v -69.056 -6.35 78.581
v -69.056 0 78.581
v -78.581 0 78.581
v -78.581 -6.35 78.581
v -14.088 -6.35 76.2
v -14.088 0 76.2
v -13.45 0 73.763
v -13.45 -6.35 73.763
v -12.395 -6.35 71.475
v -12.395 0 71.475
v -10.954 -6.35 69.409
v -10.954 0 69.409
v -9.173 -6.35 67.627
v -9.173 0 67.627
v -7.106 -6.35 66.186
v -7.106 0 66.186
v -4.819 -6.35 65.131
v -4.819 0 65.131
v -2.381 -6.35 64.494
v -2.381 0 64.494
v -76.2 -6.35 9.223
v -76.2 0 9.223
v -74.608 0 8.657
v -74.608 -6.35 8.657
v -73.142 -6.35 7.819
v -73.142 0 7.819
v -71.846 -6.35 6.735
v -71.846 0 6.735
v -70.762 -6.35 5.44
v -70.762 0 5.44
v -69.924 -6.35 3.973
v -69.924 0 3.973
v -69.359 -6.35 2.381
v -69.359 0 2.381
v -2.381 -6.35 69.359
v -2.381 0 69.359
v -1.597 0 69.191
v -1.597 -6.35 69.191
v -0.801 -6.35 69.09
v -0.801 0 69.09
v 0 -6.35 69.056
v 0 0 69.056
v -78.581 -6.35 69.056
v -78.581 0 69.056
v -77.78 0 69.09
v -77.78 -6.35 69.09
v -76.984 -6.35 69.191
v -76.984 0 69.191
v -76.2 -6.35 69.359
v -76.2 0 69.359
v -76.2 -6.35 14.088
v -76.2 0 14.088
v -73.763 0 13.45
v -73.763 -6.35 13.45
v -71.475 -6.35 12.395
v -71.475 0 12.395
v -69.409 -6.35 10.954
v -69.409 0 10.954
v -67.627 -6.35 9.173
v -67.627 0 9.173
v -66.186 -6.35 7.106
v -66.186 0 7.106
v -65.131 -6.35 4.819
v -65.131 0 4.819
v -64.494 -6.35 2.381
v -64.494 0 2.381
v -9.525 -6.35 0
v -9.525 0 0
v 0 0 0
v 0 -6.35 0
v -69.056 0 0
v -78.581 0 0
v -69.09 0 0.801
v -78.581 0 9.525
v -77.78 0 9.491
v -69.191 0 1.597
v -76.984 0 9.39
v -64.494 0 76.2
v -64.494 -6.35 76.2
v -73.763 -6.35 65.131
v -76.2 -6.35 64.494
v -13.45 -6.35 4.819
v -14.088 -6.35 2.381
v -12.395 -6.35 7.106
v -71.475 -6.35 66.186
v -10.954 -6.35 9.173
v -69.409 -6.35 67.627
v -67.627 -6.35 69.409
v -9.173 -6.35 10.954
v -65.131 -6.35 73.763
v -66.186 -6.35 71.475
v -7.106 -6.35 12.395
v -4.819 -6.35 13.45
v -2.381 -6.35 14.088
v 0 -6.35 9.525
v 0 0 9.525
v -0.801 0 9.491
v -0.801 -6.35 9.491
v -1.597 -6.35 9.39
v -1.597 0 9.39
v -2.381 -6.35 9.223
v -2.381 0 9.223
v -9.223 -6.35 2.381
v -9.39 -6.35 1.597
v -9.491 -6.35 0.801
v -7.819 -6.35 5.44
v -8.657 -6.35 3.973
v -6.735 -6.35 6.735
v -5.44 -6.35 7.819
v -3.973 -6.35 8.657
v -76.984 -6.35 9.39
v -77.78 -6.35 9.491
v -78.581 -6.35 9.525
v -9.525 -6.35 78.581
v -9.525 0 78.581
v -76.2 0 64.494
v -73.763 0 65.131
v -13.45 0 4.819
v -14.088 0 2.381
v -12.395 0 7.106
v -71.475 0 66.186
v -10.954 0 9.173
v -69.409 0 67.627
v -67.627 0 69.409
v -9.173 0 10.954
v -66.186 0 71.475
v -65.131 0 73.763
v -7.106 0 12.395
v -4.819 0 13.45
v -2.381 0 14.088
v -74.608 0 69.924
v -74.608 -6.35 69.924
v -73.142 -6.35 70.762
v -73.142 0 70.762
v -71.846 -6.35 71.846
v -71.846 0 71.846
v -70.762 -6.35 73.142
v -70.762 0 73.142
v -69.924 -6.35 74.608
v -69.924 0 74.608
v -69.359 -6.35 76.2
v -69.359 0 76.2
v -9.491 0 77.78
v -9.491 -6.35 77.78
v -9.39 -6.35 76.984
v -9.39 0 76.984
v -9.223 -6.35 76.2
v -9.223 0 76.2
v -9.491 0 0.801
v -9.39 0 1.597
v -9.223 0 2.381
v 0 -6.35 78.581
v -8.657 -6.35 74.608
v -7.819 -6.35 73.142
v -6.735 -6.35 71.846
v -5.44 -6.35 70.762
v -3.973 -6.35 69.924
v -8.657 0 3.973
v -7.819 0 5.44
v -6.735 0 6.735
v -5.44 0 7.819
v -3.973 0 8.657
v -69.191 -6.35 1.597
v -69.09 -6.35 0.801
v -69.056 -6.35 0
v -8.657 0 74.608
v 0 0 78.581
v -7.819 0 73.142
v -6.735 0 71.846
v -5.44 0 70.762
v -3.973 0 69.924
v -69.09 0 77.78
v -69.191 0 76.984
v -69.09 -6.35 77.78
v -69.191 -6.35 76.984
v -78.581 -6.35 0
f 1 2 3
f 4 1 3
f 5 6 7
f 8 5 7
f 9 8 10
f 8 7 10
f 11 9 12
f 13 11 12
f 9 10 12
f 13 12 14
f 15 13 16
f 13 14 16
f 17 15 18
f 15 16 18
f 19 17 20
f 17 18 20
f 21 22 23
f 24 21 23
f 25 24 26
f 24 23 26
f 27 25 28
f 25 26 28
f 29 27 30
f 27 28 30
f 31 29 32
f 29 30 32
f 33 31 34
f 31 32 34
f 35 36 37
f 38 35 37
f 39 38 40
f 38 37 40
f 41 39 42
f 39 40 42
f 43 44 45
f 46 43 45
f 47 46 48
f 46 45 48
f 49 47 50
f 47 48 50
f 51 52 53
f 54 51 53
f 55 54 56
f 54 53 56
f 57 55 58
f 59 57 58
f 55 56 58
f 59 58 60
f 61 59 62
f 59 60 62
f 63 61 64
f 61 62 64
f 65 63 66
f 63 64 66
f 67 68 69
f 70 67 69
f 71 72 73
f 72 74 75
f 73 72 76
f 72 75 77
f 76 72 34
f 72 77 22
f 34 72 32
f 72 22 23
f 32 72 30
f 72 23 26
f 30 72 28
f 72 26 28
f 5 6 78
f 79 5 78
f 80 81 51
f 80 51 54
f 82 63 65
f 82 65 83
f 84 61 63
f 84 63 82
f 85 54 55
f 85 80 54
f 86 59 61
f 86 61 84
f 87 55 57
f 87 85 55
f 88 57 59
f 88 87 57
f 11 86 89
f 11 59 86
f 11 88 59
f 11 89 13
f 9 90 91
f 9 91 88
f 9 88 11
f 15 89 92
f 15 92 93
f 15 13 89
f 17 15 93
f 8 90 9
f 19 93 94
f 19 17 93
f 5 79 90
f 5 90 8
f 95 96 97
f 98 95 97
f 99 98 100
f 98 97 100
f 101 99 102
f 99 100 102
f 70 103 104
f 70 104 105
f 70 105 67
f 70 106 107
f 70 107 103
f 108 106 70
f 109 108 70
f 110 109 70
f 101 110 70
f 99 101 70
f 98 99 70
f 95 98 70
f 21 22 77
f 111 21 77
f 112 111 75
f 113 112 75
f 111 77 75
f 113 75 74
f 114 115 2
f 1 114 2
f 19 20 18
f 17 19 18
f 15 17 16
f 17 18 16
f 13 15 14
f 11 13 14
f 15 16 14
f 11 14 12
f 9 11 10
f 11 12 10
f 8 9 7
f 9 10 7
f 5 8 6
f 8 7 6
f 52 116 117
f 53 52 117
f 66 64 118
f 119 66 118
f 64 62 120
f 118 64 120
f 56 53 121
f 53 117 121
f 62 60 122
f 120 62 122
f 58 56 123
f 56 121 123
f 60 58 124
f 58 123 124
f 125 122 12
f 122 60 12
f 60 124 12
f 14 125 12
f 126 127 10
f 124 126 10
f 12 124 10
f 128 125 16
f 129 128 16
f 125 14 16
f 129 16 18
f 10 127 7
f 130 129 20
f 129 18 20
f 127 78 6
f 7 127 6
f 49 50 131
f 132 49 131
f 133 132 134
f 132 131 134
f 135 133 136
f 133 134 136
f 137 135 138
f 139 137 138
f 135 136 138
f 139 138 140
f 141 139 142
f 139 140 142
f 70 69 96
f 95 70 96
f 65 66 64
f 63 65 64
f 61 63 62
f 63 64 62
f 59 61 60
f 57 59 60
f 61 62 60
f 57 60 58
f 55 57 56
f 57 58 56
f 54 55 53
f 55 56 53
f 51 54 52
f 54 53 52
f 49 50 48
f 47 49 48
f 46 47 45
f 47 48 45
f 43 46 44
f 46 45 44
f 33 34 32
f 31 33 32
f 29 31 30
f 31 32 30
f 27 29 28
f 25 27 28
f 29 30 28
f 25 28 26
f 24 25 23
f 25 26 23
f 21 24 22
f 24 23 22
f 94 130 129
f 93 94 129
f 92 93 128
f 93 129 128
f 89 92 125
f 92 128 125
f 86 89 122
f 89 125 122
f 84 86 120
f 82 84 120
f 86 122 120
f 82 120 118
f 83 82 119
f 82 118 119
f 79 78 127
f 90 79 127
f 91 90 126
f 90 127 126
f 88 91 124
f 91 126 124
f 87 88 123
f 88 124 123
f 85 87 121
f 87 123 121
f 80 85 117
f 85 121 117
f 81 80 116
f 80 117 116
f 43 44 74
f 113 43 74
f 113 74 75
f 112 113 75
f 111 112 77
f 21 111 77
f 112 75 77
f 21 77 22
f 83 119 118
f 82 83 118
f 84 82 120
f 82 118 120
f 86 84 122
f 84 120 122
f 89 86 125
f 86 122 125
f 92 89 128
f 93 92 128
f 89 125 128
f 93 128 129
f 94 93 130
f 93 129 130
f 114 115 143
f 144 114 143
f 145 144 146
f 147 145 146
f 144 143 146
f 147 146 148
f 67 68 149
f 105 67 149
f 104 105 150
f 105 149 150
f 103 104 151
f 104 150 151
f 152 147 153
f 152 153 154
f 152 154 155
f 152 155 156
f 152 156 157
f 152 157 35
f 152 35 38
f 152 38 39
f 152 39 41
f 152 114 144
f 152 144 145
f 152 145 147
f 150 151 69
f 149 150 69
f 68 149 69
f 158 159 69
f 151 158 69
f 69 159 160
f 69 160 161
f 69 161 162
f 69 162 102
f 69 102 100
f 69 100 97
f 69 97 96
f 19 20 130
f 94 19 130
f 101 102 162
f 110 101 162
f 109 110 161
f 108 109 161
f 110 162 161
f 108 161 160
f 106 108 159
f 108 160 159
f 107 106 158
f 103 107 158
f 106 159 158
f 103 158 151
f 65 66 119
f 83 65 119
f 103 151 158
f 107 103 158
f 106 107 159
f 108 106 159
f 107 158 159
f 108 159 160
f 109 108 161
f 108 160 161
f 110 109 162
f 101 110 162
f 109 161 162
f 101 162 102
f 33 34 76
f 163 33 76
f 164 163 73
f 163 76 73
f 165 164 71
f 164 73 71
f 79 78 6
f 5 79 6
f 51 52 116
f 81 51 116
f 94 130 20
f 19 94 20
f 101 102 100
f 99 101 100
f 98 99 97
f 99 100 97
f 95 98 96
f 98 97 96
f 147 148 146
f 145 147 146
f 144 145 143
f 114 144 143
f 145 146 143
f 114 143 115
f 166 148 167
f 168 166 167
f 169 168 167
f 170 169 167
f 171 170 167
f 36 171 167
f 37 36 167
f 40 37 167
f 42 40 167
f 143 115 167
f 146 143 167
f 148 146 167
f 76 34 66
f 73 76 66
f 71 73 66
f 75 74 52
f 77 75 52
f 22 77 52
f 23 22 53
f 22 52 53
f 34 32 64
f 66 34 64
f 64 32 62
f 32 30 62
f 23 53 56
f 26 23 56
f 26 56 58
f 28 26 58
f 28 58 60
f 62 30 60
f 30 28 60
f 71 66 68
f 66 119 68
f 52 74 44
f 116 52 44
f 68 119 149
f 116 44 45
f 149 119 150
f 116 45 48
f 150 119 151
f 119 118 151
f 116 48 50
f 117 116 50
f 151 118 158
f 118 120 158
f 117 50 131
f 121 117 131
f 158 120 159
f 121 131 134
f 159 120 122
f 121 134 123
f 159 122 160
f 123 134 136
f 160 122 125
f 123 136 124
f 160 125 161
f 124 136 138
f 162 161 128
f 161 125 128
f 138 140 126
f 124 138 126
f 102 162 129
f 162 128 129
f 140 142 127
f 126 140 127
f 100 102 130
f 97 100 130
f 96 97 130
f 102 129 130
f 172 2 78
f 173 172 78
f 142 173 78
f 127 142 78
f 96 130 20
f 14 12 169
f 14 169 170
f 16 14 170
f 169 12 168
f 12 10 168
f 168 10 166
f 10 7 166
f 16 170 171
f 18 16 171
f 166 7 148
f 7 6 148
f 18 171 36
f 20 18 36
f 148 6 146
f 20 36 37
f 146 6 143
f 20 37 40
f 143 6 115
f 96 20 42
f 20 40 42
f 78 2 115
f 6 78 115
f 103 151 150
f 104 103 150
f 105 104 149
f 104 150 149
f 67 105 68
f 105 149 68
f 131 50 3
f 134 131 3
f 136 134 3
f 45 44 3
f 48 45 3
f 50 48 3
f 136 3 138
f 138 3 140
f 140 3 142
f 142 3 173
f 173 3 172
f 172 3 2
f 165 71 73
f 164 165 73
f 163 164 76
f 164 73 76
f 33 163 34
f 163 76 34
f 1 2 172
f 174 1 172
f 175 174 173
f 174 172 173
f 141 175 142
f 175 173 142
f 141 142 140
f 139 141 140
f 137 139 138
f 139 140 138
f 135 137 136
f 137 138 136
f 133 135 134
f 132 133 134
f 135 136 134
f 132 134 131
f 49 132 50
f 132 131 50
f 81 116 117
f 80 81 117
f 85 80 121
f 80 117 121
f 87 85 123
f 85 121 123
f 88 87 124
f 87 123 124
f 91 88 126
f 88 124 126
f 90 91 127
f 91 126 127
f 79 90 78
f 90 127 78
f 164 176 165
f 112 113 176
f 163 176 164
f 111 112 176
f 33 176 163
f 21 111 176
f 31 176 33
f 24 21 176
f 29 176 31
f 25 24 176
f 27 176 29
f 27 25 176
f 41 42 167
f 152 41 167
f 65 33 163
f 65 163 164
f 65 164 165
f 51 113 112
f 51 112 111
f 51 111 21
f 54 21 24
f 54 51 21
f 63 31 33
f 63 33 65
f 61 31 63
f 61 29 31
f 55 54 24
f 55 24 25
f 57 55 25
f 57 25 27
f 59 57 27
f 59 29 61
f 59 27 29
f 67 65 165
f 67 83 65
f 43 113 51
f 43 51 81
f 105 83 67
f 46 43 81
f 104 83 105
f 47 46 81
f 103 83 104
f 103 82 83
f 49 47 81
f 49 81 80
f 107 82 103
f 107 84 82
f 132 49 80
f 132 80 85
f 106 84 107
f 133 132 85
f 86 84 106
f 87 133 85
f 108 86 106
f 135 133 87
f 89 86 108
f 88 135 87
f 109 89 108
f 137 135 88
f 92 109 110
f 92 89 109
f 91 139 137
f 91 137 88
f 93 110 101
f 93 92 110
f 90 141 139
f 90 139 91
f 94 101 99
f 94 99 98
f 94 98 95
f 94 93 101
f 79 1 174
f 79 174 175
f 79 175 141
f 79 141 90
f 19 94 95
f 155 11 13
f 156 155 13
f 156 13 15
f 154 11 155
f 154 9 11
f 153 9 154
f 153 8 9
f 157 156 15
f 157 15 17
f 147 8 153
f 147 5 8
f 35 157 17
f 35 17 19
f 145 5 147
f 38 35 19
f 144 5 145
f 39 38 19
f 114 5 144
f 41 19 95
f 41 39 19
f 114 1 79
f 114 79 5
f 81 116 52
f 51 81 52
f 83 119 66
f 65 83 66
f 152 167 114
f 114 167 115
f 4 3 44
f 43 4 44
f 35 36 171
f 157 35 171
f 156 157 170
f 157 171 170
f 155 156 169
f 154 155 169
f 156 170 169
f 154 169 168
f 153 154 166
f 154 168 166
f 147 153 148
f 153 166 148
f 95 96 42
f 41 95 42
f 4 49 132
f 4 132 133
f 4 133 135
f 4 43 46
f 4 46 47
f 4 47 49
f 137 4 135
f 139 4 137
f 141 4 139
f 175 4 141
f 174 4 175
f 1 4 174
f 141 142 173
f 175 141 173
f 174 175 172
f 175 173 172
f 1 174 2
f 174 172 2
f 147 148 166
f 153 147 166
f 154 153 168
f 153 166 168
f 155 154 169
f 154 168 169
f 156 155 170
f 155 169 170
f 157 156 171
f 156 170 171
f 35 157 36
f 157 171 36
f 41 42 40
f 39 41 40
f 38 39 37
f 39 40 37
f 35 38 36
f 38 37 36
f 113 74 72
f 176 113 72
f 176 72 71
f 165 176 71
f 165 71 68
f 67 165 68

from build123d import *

# Parameters (mm, degrees)
F2_DEPTH = 6.35
F3_DEPTH = 6.35
F1_W     = 2.38125
F1_H     = 2.38125
F4_DEPTH = 6.35


with BuildPart() as f2:
    # F1 (on face) → F2 (new body)
    with BuildSketch(Plane.XZ):
        with BuildLine():
            Line((-76.2, 64.4935850165), (-76.2, 14.0876649835))
            ThreePointArc((-76.2, 14.0876649835), (-68.4784618638, 10.1027881362), (-64.4935850165, 2.38125))
            Line((-64.4935850165, 2.38125), (-14.0876649835, 2.38125))
            ThreePointArc((-14.0876649835, 2.38125), (-10.1027881362, 10.1027881362), (-2.38125, 14.0876649835))
            Line((-2.38125, 14.0876649835), (-2.38125, 64.4935850165))
            ThreePointArc((-2.38125, 64.4935850165), (-10.1027881362, 68.4784618638), (-14.0876649835, 76.2))
            Line((-14.0876649835, 76.2), (-64.4935850165, 76.2))
            ThreePointArc((-64.4935850165, 76.2), (-68.4784618638, 68.4784618638), (-76.2, 64.4935850165))
        make_face()
    extrude(amount=F2_DEPTH)


with BuildPart() as f3:
    # F1 (on face) → F3 (new body)
    with BuildSketch(Plane.XZ):
        with BuildLine():
            Line((-76.2, 76.2), (-76.2, 69.3587084068))
            ThreePointArc((-76.2, 69.3587084068), (-71.8460579092, 71.8460579092), (-69.3587084068, 76.2))
            Line((-69.3587084068, 76.2), (-76.2, 76.2))
        make_face()
        with BuildLine():
            Line((-78.58125, 78.58125), (-78.58125, 69.05625))
            ThreePointArc((-78.58125, 69.05625), (-77.3810591141, 69.1321671431), (-76.2, 69.3587084068))
            Line((-76.2, 69.3587084068), (-76.2, 76.2))
            Line((-76.2, 76.2), (-69.3587084068, 76.2))
            ThreePointArc((-69.3587084068, 76.2), (-69.1321671431, 77.3810591141), (-69.05625, 78.58125))
            Line((-69.05625, 78.58125), (-78.58125, 78.58125))
        make_face()
    extrude(amount=F3_DEPTH)


with BuildPart() as f3b:
    # F1 (on face) → F3, piece 2 (new body)
    with BuildSketch(Plane.XZ):
        with BuildLine():
            Line((-2.38125, 76.2), (-9.2225415932, 76.2))
            ThreePointArc((-9.2225415932, 76.2), (-6.7351920908, 71.8460579092), (-2.38125, 69.3587084068))
            Line((-2.38125, 69.3587084068), (-2.38125, 76.2))
        make_face()
        with BuildLine():
            ThreePointArc((-2.38125, 69.3587084068), (-1.2001908859, 69.1321671431), (0, 69.05625))
            Line((0, 69.05625), (0, 76.2))
            Line((0, 76.2), (-2.38125, 76.2))
            Line((-2.38125, 76.2), (-2.38125, 69.3587084068))
        make_face()
        with BuildLine():
            Line((0, 78.58125), (-9.525, 78.58125))
            ThreePointArc((-9.525, 78.58125), (-9.4490828569, 77.3810591141), (-9.2225415932, 76.2))
            Line((-9.2225415932, 76.2), (-2.38125, 76.2))
            Line((-2.38125, 76.2), (0, 76.2))
            Line((0, 76.2), (0, 78.58125))
        make_face()
    extrude(amount=F3_DEPTH)


with BuildPart() as f3c:
    # F1 (on face) → F3, piece 3 (new body)
    with BuildSketch(Plane.XZ):
        with BuildLine():
            ThreePointArc((-9.2225415932, 2.38125), (-9.4490828569, 1.2001908859), (-9.525, 0))
            Line((-9.525, 0), (-2.38125, 0))
            Line((-2.38125, 0), (-2.38125, 2.38125))
            Line((-2.38125, 2.38125), (-9.2225415932, 2.38125))
        make_face()
        with BuildLine():
            ThreePointArc((-2.38125, 9.2225415932), (-6.7351920908, 6.7351920908), (-9.2225415932, 2.38125))
            Line((-9.2225415932, 2.38125), (-2.38125, 2.38125))
            Line((-2.38125, 2.38125), (-2.38125, 9.2225415932))
        make_face()
        with Locations((-1.190625, 1.190625)):
            Rectangle(F1_W, F1_H)
        with BuildLine():
            Line((-2.38125, 2.38125), (0, 2.38125))
            Line((0, 2.38125), (0, 9.525))
            ThreePointArc((0, 9.525), (-1.2001908859, 9.4490828569), (-2.38125, 9.2225415932))
            Line((-2.38125, 9.2225415932), (-2.38125, 2.38125))
        make_face()
    extrude(amount=F3_DEPTH)


with BuildPart() as f3d:
    # F1 (on face) → F3, piece 4 (new body)
    with BuildSketch(Plane.XZ):
        with BuildLine():
            ThreePointArc((-69.3587084068, 2.38125), (-71.8460579092, 6.7351920908), (-76.2, 9.2225415932))
            Line((-76.2, 9.2225415932), (-76.2, 2.38125))
            Line((-76.2, 2.38125), (-69.3587084068, 2.38125))
        make_face()
        with BuildLine():
            Line((-76.2, 2.38125), (-76.2, 0))
            Line((-76.2, 0), (-69.05625, 0))
            ThreePointArc((-69.05625, 0), (-69.1321671431, 1.2001908859), (-69.3587084068, 2.38125))
            Line((-69.3587084068, 2.38125), (-76.2, 2.38125))
        make_face()
        with BuildLine():
            Line((-78.58125, 9.525), (-78.58125, 0))
            Line((-78.58125, 0), (-76.2, 0))
            Line((-76.2, 0), (-76.2, 2.38125))
            Line((-76.2, 2.38125), (-76.2, 9.2225415932))
            ThreePointArc((-76.2, 9.2225415932), (-77.3810591141, 9.4490828569), (-78.58125, 9.525))
        make_face()
    extrude(amount=F3_DEPTH)


with BuildPart() as f4:
    # F1 (on face) → F4 (new body)
    with BuildSketch(Plane.XZ):
        with BuildLine():
            ThreePointArc((-64.4935850165, 76.2), (-64.3437964057, 77.3864398063), (-64.29375, 78.58125))
            Line((-64.29375, 78.58125), (-69.05625, 78.58125))
            ThreePointArc((-69.05625, 78.58125), (-69.1321671431, 77.3810591141), (-69.3587084068, 76.2))
            Line((-69.3587084068, 76.2), (-64.4935850165, 76.2))
        make_face()
        with BuildLine():
            Line((-76.2, 69.3587084068), (-76.2, 64.4935850165))
            ThreePointArc((-76.2, 64.4935850165), (-68.4784618638, 68.4784618638), (-64.4935850165, 76.2))
            Line((-64.4935850165, 76.2), (-69.3587084068, 76.2))
            ThreePointArc((-69.3587084068, 76.2), (-71.8460579092, 71.8460579092), (-76.2, 69.3587084068))
        make_face()
        with BuildLine():
            Line((-78.58125, 69.05625), (-78.58125, 64.29375))
            ThreePointArc((-78.58125, 64.29375), (-77.3864398063, 64.3437964057), (-76.2, 64.4935850165))
            Line((-76.2, 64.4935850165), (-76.2, 69.3587084068))
            ThreePointArc((-76.2, 69.3587084068), (-77.3810591141, 69.1321671431), (-78.58125, 69.05625))
        make_face()
        with BuildLine():
            Line((-78.58125, 64.29375), (-78.58125, 14.2875))
            ThreePointArc((-78.58125, 14.2875), (-77.3864398063, 14.2374535943), (-76.2, 14.0876649835))
            Line((-76.2, 14.0876649835), (-76.2, 64.4935850165))
            ThreePointArc((-76.2, 64.4935850165), (-77.3864398063, 64.3437964057), (-78.58125, 64.29375))
        make_face()
        with BuildLine():
            ThreePointArc((-76.2, 14.0876649835), (-77.3864398063, 14.2374535943), (-78.58125, 14.2875))
            Line((-78.58125, 14.2875), (-78.58125, 9.525))
            ThreePointArc((-78.58125, 9.525), (-77.3810591141, 9.4490828569), (-76.2, 9.2225415932))
            Line((-76.2, 9.2225415932), (-76.2, 14.0876649835))
        make_face()
        with BuildLine():
            ThreePointArc((-64.4935850165, 2.38125), (-68.4784618638, 10.1027881362), (-76.2, 14.0876649835))
            Line((-76.2, 14.0876649835), (-76.2, 9.2225415932))
            ThreePointArc((-76.2, 9.2225415932), (-71.8460579092, 6.7351920908), (-69.3587084068, 2.38125))
            Line((-69.3587084068, 2.38125), (-64.4935850165, 2.38125))
        make_face()
        with BuildLine():
            Line((-69.05625, 0), (-64.29375, 0))
            ThreePointArc((-64.29375, 0), (-64.3437964057, 1.1948101937), (-64.4935850165, 2.38125))
            Line((-64.4935850165, 2.38125), (-69.3587084068, 2.38125))
            ThreePointArc((-69.3587084068, 2.38125), (-69.1321671431, 1.2001908859), (-69.05625, 0))
        make_face()
        with BuildLine():
            Line((-64.29375, 0), (-14.2875, 0))
            ThreePointArc((-14.2875, 0), (-14.2374535943, 1.1948101937), (-14.0876649835, 2.38125))
            Line((-14.0876649835, 2.38125), (-64.4935850165, 2.38125))
            ThreePointArc((-64.4935850165, 2.38125), (-64.3437964057, 1.1948101937), (-64.29375, 0))
        make_face()
        with BuildLine():
            ThreePointArc((-2.38125, 14.0876649835), (-10.1027881362, 10.1027881362), (-14.0876649835, 2.38125))
            Line((-14.0876649835, 2.38125), (-9.2225415932, 2.38125))
            ThreePointArc((-9.2225415932, 2.38125), (-6.7351920908, 6.7351920908), (-2.38125, 9.2225415932))
            Line((-2.38125, 9.2225415932), (-2.38125, 14.0876649835))
        make_face()
        with BuildLine():
            ThreePointArc((-14.0876649835, 2.38125), (-14.2374535943, 1.1948101937), (-14.2875, 0))
            Line((-14.2875, 0), (-9.525, 0))
            ThreePointArc((-9.525, 0), (-9.4490828569, 1.2001908859), (-9.2225415932, 2.38125))
            Line((-9.2225415932, 2.38125), (-14.0876649835, 2.38125))
        make_face()
        with BuildLine():
            ThreePointArc((-2.38125, 14.0876649835), (-1.1948101937, 14.2374535943), (0, 14.2875))
            Line((0, 14.2875), (0, 64.29375))
            ThreePointArc((0, 64.29375), (-1.1948101937, 64.3437964057), (-2.38125, 64.4935850165))
            Line((-2.38125, 64.4935850165), (-2.38125, 14.0876649835))
        make_face()
        with BuildLine():
            Line((-9.2225415932, 76.2), (-14.0876649835, 76.2))
            ThreePointArc((-14.0876649835, 76.2), (-10.1027881362, 68.4784618638), (-2.38125, 64.4935850165))
            Line((-2.38125, 64.4935850165), (-2.38125, 69.3587084068))
            ThreePointArc((-2.38125, 69.3587084068), (-6.7351920908, 71.8460579092), (-9.2225415932, 76.2))
        make_face()
        with BuildLine():
            ThreePointArc((-2.38125, 64.4935850165), (-1.1948101937, 64.3437964057), (0, 64.29375))
            Line((0, 64.29375), (0, 69.05625))
            ThreePointArc((0, 69.05625), (-1.2001908859, 69.1321671431), (-2.38125, 69.3587084068))
            Line((-2.38125, 69.3587084068), (-2.38125, 64.4935850165))
        make_face()
        with BuildLine():
            Line((-9.525, 78.58125), (-14.2875, 78.58125))
            ThreePointArc((-14.2875, 78.58125), (-14.2374535943, 77.3864398063), (-14.0876649835, 76.2))
            Line((-14.0876649835, 76.2), (-9.2225415932, 76.2))
            ThreePointArc((-9.2225415932, 76.2), (-9.4490828569, 77.3810591141), (-9.525, 78.58125))
        make_face()
        with BuildLine():
            Line((-14.2875, 78.58125), (-64.29375, 78.58125))
            ThreePointArc((-64.29375, 78.58125), (-64.3437964057, 77.3864398063), (-64.4935850165, 76.2))
            Line((-64.4935850165, 76.2), (-14.0876649835, 76.2))
            ThreePointArc((-14.0876649835, 76.2), (-14.2374535943, 77.3864398063), (-14.2875, 78.58125))
        make_face()
        with BuildLine():
            Line((0, 9.525), (0, 14.2875))
            ThreePointArc((0, 14.2875), (-1.1948101937, 14.2374535943), (-2.38125, 14.0876649835))
            Line((-2.38125, 14.0876649835), (-2.38125, 9.2225415932))
            ThreePointArc((-2.38125, 9.2225415932), (-1.2001908859, 9.4490828569), (0, 9.525))
        make_face()
    extrude(amount=F4_DEPTH)


solid = Compound([f2.part, f3.part, f3b.part, f3c.part, f3d.part, f4.part])
